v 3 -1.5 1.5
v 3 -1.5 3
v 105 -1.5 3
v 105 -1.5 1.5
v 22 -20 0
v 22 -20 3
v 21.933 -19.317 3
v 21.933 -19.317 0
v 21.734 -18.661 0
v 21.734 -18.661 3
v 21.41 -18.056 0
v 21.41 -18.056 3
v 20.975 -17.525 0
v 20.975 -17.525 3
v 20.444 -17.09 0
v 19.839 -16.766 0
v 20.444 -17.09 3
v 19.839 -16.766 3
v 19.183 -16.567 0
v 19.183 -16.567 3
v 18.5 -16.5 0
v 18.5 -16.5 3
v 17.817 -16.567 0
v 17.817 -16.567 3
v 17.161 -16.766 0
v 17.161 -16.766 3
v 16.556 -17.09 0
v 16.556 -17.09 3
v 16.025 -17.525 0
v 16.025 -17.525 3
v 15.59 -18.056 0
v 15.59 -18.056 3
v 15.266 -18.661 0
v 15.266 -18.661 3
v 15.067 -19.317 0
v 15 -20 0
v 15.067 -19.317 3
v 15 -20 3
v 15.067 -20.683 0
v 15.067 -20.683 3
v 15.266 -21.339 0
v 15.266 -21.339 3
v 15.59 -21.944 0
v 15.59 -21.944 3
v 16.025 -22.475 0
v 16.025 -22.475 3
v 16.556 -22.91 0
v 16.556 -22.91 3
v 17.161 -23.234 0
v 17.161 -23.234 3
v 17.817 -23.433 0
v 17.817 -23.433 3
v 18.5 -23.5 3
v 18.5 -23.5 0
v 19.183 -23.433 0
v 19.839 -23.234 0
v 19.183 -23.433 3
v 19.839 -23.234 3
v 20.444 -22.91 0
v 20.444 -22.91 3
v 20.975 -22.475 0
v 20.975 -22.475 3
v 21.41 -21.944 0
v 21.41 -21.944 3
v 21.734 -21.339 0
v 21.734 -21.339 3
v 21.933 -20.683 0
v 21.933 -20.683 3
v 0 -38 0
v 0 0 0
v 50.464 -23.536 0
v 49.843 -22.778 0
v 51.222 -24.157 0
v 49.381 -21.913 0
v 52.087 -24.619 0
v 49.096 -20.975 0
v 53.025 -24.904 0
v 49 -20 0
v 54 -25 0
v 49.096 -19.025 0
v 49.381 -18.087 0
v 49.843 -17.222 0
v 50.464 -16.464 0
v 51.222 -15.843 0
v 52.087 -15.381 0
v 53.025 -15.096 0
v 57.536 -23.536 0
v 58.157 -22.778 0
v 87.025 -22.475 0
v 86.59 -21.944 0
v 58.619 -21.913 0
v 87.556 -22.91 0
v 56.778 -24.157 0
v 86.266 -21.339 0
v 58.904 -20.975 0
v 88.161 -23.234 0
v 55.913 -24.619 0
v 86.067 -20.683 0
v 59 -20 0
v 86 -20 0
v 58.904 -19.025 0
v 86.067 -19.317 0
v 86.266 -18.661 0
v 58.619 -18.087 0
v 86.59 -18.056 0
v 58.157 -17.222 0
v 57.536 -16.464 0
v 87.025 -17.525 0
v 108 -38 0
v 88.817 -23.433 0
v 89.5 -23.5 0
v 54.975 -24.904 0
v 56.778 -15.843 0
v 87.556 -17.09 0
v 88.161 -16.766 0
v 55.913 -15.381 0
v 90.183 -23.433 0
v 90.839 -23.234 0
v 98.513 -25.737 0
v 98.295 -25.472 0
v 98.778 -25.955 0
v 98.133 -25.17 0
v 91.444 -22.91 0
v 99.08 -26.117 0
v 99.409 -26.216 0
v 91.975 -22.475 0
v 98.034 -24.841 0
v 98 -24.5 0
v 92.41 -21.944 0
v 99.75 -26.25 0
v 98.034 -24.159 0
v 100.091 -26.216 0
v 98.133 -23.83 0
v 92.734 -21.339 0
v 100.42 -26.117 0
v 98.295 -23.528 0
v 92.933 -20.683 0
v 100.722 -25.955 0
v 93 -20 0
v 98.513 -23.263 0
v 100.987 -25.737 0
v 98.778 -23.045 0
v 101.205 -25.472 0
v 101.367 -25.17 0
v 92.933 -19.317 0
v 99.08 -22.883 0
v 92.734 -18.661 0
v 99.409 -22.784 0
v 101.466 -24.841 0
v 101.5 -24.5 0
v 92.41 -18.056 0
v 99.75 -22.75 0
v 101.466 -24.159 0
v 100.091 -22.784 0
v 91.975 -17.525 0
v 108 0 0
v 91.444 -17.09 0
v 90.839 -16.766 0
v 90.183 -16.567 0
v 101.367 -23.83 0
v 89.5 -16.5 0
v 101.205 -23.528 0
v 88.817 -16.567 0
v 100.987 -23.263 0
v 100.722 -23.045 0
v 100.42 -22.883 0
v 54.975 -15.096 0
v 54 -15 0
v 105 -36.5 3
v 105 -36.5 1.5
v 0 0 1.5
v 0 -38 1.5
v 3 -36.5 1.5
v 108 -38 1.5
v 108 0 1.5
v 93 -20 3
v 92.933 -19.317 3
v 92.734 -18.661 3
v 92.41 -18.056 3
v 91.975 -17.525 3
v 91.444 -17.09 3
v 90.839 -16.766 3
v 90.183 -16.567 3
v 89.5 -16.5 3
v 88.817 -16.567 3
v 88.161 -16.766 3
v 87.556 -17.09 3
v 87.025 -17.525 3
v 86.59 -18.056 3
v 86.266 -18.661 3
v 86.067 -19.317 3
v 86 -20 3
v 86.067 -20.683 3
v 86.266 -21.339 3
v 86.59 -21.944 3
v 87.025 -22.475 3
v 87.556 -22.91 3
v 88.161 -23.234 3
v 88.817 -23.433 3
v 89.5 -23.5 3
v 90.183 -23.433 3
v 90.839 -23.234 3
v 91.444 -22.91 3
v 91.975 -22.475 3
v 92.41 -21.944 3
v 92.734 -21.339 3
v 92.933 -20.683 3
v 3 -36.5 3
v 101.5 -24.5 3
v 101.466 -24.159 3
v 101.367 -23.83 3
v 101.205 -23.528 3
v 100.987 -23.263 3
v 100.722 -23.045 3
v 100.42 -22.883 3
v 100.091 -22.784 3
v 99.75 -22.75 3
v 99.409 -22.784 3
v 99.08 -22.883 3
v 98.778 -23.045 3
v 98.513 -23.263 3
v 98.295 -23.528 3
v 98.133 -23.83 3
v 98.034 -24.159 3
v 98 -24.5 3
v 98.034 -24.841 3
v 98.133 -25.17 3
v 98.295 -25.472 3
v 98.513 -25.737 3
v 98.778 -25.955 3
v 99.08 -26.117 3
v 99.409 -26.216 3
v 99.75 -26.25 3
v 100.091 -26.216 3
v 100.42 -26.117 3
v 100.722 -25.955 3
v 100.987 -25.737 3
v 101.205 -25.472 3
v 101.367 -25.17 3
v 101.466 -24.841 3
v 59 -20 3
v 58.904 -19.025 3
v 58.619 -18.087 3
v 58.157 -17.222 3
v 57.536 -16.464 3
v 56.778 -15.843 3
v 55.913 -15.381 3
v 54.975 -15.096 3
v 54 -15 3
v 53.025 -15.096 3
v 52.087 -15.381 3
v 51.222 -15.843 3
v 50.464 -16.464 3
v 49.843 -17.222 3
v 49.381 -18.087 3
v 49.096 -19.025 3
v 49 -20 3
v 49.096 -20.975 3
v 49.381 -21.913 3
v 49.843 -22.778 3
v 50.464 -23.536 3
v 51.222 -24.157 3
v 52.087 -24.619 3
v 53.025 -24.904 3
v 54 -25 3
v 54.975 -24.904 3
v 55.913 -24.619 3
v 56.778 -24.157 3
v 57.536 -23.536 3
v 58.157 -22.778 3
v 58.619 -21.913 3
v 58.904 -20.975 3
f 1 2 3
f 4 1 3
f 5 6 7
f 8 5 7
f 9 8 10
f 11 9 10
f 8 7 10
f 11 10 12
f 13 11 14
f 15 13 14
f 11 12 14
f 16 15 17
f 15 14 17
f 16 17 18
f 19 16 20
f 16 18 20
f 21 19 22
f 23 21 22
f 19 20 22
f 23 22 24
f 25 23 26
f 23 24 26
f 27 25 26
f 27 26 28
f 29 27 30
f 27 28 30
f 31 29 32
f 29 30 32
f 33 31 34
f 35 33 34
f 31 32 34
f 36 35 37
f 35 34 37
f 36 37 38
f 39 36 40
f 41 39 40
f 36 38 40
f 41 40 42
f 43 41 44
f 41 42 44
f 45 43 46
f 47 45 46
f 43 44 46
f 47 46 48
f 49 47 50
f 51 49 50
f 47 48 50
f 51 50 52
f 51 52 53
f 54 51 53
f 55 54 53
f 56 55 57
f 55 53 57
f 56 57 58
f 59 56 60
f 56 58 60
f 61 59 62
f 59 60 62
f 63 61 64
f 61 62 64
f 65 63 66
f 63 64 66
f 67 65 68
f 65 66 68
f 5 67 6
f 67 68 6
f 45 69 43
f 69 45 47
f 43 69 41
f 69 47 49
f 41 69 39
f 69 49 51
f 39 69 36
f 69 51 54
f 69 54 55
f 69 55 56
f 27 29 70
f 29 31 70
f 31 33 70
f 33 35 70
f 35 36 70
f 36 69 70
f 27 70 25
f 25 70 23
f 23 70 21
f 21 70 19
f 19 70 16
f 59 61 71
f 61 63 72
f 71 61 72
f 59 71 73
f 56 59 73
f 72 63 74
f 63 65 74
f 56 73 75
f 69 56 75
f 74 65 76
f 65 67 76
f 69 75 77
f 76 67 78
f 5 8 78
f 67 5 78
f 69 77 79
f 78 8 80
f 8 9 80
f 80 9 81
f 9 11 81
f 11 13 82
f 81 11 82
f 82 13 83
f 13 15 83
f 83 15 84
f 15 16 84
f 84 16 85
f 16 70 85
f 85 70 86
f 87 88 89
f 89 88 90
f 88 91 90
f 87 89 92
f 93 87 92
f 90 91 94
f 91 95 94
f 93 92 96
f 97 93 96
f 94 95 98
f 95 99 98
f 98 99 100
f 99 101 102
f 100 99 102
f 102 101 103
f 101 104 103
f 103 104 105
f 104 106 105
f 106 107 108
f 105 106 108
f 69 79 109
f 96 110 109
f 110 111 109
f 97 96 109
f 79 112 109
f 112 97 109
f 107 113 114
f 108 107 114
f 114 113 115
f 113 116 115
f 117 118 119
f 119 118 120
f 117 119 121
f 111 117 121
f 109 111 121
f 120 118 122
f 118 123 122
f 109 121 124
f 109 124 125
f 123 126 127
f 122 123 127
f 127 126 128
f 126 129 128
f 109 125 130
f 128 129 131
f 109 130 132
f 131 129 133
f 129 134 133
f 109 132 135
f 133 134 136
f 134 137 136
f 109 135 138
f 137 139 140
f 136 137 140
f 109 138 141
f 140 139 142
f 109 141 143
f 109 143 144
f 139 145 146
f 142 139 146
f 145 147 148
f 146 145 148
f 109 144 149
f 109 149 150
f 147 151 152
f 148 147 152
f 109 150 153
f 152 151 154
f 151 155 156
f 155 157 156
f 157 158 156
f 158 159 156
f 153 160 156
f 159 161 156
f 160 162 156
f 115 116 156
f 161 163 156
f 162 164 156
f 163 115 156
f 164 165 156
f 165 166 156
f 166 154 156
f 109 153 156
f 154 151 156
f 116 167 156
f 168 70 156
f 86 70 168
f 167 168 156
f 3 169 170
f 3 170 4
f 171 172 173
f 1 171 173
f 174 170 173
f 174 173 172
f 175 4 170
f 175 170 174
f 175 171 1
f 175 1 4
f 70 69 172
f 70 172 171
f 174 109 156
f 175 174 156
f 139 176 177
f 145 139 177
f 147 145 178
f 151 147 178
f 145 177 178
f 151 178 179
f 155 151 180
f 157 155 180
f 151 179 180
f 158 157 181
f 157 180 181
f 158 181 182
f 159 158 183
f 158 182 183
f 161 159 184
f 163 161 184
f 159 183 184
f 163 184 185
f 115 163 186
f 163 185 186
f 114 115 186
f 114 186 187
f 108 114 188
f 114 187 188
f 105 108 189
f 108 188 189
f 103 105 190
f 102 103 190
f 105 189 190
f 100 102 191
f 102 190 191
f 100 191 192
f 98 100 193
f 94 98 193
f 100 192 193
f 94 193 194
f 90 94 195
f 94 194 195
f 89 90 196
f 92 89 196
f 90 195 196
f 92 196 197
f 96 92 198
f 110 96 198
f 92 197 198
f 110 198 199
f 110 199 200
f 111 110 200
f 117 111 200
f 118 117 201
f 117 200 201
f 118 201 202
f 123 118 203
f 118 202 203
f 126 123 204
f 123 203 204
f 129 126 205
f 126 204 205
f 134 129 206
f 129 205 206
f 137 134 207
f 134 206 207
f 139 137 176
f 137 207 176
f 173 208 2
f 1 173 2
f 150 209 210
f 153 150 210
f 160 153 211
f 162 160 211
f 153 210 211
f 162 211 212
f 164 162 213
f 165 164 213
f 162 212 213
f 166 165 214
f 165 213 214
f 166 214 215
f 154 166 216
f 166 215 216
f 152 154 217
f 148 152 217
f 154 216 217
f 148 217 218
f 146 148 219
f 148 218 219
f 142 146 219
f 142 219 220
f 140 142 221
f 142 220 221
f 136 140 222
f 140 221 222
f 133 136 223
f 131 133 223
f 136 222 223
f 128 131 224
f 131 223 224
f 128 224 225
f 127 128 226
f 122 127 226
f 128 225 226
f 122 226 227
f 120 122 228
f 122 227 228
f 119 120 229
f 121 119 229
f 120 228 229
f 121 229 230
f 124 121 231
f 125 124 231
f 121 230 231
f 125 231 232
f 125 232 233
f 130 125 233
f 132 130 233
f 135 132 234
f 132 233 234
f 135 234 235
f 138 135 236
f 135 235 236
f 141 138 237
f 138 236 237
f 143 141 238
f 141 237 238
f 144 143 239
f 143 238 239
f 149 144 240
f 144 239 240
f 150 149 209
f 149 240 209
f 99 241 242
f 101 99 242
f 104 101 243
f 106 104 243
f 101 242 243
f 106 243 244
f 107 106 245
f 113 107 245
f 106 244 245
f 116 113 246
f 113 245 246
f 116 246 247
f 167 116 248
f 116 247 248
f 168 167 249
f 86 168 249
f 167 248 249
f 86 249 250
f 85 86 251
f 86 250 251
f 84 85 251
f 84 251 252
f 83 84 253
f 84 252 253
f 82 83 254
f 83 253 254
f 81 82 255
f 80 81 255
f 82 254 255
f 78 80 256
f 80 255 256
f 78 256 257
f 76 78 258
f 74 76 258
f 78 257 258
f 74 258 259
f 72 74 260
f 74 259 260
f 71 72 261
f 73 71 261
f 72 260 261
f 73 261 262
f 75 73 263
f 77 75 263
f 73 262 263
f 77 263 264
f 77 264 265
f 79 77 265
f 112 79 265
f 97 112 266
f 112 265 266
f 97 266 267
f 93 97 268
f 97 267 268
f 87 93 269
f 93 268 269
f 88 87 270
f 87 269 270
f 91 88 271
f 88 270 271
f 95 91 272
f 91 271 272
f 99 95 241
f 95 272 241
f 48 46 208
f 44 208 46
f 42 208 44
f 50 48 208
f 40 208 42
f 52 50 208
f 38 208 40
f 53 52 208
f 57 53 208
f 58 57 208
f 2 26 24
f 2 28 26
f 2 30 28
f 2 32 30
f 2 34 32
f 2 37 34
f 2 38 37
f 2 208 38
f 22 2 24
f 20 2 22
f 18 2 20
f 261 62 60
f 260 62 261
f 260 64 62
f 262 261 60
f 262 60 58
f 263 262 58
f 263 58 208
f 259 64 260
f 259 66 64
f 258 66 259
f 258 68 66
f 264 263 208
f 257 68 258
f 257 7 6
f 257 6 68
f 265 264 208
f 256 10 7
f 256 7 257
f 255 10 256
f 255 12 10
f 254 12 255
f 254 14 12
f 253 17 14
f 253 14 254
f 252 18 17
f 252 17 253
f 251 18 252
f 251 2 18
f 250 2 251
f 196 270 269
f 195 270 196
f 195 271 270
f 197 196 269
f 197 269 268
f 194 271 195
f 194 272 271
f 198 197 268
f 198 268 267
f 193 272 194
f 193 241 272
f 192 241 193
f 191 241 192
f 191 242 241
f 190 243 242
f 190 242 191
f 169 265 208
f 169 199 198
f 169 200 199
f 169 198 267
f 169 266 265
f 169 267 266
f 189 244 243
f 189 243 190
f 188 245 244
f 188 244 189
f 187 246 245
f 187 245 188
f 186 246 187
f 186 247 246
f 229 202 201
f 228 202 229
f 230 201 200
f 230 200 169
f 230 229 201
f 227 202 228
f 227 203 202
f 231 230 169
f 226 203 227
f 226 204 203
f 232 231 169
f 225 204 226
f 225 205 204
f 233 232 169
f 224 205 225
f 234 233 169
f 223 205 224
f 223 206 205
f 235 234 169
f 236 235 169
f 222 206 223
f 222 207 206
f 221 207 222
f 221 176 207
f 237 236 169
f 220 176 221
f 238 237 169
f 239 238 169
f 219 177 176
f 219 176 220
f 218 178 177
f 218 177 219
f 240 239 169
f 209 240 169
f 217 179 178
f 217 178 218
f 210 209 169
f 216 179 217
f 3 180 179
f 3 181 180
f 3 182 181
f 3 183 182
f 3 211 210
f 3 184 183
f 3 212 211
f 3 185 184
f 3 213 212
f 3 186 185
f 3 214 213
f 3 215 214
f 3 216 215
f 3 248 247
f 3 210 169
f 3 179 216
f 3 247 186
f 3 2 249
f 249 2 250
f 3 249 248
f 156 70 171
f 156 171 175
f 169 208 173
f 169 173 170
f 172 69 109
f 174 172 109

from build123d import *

# Parameters (mm, degrees)
SKETCH_W        = 108
SKETCH_H        = 38
PAD_DEPTH       = 3
SKETCH002_W     = 3
SKETCH002_H     = 38
POCKET_DEPTH    = 1.5
SKETCH003_W     = 3
SKETCH003_H     = 38
POCKET001_DEPTH = 1.5
SKETCH004_W     = 102
SKETCH004_H     = 1.5
POCKET002_DEPTH = 1.5
SKETCH005_W     = 102
SKETCH005_H     = 1.5
POCKET003_DEPTH = 1.5
SKETCH006_R     = 5
POCKET004_DEPTH = 3
SKETCH008_R     = 3.5
POCKET005_DEPTH = 3
SKETCH009_R     = 3.5
POCKET006_DEPTH = 3
SKETCH010_R     = 1.75
POCKET007_DEPTH = 3


with BuildPart() as part:
    # Sketch → Pad (new body)
    with BuildSketch(Plane.XY):
        with Locations((54, -19)):
            Rectangle(SKETCH_W, SKETCH_H)
    extrude(amount=PAD_DEPTH)

    # Sketch002 (on Face6 of Pad) → Pocket (cut)
    with BuildSketch(Plane.XY.offset(3)):
        with Locations((1.5, -19)):
            Rectangle(SKETCH002_W, SKETCH002_H)
    extrude(amount=-POCKET_DEPTH, mode=Mode.SUBTRACT)

    # Sketch003 (on Face4 of Pocket) → Pocket001 (cut)
    with BuildSketch(Plane.XY.offset(3)):
        with Locations((106.5, -19)):
            Rectangle(SKETCH003_W, SKETCH003_H)
    extrude(amount=-POCKET001_DEPTH, mode=Mode.SUBTRACT)

    # Sketch004 (on Face6 of Pocket001) → Pocket002 (cut)
    with BuildSketch(Plane.XY.offset(3)):
        with Locations((54, -0.75)):
            Rectangle(SKETCH004_W, SKETCH004_H)
    extrude(amount=-POCKET002_DEPTH, mode=Mode.SUBTRACT)

    # Sketch005 (on Face12 of Pocket002) → Pocket003 (cut)
    with BuildSketch(Plane.XY.offset(3)):
        with Locations((54, -37.25)):
            Rectangle(SKETCH005_W, SKETCH005_H)
    extrude(amount=-POCKET003_DEPTH, mode=Mode.SUBTRACT)

    # Sketch006 (on Face13 of Pocket003) → Pocket004 (cut)
    with BuildSketch(Plane.XY.offset(3)):
        with Locations((54, -20)):
            Circle(SKETCH006_R)
    extrude(amount=-POCKET004_DEPTH, mode=Mode.SUBTRACT)

    # Sketch008 (on Face14 of Pocket004) → Pocket005 (cut)
    with BuildSketch(Plane.XY.offset(3)):
        with Locations((18.5, -20)):
            Circle(SKETCH008_R)
    extrude(amount=-POCKET005_DEPTH, mode=Mode.SUBTRACT)

    # Sketch009 (on Face15 of Pocket005) → Pocket006 (cut)
    with BuildSketch(Plane.XY.offset(3)):
        with Locations((89.5, -20)):
            Circle(SKETCH009_R)
    extrude(amount=-POCKET006_DEPTH, mode=Mode.SUBTRACT)

    # Sketch010 (on Face16 of Pocket006) → Pocket007 (cut)
    with BuildSketch(Plane.XY.offset(3)):
        with Locations((99.75, -24.5)):
            Circle(SKETCH010_R)
    extrude(amount=-POCKET007_DEPTH, mode=Mode.SUBTRACT)


solid = part.part
